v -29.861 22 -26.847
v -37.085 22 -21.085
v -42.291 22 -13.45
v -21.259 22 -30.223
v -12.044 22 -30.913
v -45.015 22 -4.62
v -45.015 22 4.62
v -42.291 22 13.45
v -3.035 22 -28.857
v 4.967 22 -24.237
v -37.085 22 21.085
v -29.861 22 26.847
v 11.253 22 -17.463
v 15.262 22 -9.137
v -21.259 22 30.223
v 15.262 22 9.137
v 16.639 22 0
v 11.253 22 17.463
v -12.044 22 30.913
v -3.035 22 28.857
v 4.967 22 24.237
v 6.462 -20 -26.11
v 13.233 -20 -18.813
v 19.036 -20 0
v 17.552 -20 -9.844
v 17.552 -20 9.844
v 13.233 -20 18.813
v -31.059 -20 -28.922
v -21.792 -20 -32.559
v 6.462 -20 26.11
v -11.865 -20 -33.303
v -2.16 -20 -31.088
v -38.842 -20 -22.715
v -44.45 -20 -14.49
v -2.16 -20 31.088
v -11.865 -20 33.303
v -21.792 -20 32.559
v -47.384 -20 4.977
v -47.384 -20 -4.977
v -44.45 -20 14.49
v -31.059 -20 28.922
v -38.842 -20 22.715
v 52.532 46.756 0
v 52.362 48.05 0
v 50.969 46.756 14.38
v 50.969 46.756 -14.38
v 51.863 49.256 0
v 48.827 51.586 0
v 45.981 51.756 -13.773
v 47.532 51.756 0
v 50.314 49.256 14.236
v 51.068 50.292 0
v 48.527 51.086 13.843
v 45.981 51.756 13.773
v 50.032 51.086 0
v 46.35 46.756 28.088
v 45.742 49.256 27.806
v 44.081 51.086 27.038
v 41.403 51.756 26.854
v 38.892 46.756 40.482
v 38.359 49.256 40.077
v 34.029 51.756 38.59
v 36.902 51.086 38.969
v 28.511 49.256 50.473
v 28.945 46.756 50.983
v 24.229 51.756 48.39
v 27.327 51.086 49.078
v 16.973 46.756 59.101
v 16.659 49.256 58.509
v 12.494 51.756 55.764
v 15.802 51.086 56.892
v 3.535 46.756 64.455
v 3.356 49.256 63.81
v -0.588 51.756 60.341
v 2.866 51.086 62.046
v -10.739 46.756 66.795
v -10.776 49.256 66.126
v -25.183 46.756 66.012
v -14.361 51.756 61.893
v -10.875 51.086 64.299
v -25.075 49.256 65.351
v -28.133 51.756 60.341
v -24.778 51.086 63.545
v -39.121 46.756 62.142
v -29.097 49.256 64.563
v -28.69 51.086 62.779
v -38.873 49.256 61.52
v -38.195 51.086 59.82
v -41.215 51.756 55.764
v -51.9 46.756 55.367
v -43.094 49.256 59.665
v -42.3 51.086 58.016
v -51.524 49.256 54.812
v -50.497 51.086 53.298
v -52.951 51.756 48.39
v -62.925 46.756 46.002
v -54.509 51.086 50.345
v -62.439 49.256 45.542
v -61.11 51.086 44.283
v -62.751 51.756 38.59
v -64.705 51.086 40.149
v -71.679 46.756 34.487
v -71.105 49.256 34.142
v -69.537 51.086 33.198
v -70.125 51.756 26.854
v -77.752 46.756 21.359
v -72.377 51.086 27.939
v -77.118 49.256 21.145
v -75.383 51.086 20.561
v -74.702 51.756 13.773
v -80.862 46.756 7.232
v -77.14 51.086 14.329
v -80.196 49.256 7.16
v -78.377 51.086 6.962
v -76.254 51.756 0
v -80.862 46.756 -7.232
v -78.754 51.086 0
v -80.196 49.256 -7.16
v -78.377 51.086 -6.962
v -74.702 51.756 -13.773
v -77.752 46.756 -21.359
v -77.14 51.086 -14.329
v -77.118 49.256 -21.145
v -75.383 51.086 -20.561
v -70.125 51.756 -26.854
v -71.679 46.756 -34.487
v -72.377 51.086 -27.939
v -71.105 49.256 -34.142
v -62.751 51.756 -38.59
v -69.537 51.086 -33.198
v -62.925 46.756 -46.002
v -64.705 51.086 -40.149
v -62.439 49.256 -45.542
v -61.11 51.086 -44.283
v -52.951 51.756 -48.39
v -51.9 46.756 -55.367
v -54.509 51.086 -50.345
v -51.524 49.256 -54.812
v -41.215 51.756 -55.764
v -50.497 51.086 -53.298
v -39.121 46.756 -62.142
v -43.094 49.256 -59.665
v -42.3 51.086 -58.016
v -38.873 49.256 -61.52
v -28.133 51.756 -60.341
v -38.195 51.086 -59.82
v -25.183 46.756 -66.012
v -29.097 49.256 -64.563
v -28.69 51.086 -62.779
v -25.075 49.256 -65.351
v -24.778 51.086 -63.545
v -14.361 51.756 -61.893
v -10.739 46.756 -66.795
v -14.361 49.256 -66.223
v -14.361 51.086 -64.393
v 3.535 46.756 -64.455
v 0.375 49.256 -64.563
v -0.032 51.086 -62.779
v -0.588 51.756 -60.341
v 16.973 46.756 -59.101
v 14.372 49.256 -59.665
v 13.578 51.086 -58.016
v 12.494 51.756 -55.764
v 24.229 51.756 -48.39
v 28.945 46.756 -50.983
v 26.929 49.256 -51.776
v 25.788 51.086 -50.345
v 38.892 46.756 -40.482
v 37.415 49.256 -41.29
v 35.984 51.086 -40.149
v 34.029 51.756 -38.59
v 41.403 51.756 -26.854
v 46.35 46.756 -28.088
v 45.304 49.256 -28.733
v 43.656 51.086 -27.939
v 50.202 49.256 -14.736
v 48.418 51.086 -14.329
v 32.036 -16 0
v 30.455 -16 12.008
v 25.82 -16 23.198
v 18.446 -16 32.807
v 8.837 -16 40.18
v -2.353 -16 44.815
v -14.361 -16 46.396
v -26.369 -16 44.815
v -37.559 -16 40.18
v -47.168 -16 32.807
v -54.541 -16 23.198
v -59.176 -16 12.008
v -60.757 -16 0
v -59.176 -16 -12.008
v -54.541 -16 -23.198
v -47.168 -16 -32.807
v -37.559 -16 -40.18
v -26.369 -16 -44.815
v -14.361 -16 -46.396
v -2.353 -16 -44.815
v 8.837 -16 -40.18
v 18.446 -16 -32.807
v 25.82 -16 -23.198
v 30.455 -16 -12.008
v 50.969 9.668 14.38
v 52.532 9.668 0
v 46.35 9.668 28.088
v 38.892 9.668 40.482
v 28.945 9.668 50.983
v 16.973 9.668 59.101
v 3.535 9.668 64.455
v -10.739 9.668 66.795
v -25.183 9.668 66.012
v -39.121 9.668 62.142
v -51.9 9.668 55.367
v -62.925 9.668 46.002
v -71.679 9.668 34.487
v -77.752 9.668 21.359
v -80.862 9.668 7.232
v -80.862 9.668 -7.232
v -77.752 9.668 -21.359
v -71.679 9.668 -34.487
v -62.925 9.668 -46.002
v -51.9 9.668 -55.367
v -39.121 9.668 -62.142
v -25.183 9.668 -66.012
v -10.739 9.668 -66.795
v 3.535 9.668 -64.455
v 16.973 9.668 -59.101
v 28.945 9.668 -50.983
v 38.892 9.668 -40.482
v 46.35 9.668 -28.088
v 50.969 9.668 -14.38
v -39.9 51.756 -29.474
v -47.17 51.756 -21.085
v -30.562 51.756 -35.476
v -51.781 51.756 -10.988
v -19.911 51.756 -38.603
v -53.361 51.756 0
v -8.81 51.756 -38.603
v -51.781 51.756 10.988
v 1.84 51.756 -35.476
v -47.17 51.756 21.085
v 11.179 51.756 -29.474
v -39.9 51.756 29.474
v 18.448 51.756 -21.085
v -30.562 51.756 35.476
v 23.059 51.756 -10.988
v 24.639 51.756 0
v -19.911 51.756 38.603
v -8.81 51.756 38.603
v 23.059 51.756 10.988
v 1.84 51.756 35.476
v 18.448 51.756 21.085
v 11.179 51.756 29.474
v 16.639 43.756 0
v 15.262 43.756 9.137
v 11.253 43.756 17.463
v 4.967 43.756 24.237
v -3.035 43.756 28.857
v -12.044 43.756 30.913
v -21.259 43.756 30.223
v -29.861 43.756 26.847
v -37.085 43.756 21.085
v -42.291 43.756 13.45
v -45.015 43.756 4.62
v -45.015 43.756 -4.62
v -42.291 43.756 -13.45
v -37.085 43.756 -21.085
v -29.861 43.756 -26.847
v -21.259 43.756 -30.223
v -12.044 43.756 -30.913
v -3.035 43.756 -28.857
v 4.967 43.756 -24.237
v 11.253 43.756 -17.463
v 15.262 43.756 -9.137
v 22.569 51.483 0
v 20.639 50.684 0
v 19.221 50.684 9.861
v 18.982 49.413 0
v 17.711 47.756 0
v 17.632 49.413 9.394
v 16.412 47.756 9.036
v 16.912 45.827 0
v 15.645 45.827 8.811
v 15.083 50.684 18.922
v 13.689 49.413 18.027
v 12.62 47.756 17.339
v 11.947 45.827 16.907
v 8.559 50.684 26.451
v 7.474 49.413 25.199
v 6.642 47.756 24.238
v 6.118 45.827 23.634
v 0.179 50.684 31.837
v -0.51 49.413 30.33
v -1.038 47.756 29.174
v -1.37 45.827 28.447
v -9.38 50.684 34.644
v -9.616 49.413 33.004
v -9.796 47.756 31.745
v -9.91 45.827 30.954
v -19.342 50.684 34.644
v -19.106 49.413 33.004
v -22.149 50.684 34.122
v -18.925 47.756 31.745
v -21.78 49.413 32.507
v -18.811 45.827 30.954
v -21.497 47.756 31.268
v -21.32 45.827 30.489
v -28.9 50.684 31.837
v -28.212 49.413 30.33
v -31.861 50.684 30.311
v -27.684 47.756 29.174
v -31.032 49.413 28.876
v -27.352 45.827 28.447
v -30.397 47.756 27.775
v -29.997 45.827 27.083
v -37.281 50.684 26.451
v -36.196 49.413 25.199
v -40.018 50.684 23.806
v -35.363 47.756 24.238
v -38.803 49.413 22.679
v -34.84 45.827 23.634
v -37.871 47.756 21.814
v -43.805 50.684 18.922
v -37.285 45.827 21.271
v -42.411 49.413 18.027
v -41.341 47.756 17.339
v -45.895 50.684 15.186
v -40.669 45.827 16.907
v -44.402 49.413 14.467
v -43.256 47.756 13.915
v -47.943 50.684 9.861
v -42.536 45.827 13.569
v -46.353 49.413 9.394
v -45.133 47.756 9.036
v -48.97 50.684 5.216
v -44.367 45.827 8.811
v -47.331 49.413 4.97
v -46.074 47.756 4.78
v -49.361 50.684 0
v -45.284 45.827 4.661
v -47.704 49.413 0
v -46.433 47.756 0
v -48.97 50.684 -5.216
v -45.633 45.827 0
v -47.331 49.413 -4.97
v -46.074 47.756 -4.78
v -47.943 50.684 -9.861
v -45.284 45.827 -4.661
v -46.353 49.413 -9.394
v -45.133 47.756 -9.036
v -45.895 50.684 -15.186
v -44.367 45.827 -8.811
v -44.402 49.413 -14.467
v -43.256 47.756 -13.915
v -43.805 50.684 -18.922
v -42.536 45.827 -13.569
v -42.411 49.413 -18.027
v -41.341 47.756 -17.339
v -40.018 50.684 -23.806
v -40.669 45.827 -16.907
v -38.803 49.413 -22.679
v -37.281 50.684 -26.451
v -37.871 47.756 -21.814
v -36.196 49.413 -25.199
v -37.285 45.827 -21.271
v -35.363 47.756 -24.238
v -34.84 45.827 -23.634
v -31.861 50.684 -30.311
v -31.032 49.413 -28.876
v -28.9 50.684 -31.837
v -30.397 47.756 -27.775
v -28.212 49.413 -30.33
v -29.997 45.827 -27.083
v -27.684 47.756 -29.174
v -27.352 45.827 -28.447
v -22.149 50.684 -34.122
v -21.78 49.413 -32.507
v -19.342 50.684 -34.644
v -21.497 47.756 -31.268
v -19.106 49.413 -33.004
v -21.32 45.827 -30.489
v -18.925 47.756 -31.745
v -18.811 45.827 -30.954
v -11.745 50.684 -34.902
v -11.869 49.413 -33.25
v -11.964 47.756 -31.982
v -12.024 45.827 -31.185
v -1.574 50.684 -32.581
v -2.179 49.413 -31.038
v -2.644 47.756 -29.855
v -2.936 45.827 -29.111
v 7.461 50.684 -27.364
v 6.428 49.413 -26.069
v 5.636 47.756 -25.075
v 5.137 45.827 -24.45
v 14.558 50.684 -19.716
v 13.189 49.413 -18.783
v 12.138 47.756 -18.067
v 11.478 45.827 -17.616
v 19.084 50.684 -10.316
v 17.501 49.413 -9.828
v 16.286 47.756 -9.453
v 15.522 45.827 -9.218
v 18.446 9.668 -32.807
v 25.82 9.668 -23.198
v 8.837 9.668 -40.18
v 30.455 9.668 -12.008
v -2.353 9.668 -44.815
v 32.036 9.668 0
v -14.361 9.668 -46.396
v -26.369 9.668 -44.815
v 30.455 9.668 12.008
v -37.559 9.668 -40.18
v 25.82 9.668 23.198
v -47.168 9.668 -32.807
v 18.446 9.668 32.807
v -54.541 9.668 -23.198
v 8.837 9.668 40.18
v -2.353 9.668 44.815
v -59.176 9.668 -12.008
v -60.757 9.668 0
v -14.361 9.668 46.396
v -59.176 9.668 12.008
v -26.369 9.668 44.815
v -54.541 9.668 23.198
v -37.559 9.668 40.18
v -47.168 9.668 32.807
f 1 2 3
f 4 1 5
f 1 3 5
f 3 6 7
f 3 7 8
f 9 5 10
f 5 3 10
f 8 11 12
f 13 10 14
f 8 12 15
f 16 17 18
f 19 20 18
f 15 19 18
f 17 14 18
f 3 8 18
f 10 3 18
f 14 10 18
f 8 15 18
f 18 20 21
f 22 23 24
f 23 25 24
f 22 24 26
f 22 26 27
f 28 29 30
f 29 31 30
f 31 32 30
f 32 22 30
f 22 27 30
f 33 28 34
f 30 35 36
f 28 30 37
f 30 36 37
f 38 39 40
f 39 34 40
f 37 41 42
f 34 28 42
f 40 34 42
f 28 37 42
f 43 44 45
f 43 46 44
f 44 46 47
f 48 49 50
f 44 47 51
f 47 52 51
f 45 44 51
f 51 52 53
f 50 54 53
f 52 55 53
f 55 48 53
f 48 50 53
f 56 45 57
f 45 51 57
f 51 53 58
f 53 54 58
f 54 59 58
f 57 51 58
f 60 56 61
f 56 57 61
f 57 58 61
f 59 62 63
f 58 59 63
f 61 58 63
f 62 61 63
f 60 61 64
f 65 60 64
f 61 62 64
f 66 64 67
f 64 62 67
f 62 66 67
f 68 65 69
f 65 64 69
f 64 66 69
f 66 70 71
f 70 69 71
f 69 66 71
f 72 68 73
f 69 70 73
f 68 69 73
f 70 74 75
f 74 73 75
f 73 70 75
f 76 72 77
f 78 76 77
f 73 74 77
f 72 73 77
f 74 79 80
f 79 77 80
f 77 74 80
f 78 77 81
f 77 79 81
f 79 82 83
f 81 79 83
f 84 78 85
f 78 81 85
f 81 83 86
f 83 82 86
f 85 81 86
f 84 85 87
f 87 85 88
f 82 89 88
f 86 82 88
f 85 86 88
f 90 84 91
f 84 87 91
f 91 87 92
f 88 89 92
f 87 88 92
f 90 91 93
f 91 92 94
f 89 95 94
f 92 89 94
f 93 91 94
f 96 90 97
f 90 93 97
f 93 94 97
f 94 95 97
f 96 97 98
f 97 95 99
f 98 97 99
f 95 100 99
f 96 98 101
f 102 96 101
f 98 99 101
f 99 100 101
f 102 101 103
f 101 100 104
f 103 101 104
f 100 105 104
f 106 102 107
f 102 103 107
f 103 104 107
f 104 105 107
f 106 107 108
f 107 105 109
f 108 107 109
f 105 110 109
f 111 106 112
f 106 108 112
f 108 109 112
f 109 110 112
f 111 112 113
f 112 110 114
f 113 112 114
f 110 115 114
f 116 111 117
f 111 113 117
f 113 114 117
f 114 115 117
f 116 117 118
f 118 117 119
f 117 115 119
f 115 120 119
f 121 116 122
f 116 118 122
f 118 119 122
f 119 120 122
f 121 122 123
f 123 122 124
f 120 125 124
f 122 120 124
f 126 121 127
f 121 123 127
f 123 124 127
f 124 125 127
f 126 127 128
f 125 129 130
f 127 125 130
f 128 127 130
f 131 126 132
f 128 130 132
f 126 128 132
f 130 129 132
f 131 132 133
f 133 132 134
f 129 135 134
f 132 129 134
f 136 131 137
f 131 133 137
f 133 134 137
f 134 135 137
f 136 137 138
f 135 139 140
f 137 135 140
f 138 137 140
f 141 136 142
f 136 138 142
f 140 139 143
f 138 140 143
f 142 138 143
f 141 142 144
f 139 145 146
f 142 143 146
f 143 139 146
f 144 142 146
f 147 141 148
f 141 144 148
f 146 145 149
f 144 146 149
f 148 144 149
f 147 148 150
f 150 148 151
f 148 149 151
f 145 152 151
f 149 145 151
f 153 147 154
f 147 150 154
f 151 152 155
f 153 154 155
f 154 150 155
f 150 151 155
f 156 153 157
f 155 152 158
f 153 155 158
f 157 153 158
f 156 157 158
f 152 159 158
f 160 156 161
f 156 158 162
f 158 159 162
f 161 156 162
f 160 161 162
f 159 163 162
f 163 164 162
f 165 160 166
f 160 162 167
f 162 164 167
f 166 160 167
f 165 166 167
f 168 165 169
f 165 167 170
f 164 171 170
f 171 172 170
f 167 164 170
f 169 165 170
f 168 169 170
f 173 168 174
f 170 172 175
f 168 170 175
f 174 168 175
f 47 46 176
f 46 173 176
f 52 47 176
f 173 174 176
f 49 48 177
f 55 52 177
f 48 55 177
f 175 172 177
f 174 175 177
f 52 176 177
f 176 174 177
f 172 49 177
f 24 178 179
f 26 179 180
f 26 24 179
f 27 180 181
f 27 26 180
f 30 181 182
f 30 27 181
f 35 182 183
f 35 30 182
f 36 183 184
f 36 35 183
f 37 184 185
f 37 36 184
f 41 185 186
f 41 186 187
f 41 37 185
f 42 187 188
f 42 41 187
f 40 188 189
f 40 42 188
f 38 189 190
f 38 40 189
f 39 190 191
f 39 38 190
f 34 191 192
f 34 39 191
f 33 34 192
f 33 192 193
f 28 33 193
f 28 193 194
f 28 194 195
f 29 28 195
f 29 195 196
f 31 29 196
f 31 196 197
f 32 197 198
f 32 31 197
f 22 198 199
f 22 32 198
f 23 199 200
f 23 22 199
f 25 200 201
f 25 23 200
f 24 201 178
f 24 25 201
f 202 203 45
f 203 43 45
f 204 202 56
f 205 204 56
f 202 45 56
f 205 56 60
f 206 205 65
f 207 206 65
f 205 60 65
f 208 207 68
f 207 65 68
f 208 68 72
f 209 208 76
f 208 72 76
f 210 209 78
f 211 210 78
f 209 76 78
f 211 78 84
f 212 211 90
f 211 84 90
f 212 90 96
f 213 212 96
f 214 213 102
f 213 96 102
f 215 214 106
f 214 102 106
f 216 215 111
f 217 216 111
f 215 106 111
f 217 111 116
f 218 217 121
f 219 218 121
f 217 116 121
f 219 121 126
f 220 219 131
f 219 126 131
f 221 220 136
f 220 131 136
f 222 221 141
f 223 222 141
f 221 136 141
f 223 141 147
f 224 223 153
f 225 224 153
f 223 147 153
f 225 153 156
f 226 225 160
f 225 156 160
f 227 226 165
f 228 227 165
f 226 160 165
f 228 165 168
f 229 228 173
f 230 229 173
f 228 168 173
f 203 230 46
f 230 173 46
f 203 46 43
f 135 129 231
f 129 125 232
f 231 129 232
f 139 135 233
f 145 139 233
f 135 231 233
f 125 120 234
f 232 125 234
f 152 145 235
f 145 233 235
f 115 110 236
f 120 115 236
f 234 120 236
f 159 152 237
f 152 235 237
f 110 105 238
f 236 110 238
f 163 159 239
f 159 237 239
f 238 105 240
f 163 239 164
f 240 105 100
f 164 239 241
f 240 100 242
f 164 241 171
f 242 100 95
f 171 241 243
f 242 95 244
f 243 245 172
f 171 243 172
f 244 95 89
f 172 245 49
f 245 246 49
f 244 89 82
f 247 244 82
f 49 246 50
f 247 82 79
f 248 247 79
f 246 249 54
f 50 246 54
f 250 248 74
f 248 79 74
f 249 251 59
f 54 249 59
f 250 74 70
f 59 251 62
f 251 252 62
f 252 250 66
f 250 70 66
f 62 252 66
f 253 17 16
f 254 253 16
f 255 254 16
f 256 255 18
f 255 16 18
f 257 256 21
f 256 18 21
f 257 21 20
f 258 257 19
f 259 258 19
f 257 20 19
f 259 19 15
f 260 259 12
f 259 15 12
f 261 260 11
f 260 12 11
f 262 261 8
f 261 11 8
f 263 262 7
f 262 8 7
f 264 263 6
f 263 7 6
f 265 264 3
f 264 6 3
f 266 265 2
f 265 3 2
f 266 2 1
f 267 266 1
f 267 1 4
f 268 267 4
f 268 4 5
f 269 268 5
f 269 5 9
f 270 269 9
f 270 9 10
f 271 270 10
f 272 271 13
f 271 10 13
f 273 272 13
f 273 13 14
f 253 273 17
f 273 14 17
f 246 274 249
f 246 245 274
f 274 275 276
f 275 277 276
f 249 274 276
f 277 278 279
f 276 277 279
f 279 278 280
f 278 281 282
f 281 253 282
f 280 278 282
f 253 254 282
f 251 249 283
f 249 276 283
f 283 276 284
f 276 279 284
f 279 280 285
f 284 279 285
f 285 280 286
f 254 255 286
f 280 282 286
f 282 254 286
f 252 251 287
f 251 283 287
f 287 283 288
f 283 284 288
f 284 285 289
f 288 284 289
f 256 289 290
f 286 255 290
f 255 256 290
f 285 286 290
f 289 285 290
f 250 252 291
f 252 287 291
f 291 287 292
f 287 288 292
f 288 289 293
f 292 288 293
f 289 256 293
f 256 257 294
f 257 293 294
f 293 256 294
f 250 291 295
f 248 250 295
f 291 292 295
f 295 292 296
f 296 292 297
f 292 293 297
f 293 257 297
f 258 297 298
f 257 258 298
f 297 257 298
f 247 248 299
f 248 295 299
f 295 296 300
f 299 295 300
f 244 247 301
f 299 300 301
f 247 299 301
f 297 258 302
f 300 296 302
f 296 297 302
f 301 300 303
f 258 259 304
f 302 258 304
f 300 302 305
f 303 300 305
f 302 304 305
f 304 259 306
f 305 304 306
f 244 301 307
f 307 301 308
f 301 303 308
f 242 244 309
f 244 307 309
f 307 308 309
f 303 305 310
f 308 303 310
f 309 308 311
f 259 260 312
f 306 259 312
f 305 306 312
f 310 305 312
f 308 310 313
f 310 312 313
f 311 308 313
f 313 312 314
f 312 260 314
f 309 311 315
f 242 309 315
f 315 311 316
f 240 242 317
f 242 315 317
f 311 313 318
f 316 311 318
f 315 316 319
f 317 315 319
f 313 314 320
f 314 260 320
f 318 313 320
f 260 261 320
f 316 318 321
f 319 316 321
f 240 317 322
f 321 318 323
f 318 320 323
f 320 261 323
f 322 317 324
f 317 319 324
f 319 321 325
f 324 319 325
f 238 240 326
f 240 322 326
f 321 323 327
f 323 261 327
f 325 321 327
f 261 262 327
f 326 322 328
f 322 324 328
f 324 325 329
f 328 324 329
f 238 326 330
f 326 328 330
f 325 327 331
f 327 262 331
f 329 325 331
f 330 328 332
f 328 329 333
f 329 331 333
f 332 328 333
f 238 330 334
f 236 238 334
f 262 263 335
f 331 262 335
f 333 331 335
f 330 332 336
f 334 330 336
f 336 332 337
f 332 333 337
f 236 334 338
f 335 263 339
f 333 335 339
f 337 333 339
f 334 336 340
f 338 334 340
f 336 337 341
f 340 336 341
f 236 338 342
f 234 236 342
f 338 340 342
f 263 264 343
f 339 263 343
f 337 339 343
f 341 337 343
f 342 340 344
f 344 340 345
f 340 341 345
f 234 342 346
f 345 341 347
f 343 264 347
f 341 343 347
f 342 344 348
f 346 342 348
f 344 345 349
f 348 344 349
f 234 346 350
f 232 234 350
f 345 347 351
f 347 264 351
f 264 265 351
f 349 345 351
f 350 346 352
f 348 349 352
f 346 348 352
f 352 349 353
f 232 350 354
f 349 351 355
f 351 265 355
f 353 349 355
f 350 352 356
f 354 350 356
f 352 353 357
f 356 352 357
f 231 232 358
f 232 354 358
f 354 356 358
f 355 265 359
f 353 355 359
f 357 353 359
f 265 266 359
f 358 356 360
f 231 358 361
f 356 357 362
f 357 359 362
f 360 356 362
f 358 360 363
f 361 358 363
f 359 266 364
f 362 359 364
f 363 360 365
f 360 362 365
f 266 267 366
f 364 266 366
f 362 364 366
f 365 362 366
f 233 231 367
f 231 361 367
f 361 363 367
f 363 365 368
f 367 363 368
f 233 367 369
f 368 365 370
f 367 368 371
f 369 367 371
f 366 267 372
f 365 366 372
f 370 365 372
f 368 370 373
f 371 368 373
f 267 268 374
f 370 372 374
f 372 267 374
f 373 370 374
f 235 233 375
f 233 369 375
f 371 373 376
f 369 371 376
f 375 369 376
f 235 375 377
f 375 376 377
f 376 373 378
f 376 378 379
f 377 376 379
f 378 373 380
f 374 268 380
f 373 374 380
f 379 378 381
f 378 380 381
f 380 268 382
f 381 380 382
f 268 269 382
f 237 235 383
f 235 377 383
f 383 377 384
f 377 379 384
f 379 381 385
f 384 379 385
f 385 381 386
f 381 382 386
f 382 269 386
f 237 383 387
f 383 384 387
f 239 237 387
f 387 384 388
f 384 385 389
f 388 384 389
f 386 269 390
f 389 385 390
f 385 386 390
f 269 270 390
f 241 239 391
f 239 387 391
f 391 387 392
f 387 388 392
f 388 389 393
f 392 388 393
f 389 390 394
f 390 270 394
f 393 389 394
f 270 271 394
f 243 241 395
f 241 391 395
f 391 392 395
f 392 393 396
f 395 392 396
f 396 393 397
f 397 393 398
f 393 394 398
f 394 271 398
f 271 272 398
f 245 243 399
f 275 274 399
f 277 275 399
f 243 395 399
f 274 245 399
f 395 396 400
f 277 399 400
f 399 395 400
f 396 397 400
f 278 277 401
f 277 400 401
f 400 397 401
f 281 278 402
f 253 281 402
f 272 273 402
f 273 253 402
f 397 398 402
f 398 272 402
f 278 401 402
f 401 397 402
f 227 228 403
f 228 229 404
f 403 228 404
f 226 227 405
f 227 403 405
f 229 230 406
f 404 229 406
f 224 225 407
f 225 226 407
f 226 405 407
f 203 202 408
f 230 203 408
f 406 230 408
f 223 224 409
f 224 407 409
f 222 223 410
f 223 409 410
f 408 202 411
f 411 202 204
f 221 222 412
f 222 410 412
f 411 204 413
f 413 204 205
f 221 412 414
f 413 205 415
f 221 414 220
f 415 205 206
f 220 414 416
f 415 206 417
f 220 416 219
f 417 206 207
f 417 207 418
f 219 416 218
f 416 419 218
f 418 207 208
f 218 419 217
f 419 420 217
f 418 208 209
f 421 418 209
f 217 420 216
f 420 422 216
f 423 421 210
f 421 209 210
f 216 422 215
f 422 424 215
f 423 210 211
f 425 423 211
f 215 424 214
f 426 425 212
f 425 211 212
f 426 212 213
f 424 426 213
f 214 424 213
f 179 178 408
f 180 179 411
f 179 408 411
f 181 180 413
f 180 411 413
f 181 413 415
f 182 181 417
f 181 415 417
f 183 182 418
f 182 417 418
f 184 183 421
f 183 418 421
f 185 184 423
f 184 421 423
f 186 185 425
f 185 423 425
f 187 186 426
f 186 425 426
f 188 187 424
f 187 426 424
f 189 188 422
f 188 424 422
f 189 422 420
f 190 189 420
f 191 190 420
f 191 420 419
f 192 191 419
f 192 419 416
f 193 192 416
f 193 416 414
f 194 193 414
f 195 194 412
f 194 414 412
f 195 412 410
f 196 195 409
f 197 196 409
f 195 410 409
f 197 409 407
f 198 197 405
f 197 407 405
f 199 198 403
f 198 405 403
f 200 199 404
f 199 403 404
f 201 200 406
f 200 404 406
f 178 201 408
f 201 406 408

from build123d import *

# Parameters (mm, degrees)
F2_R     = 8
F3_SIZE2 = 13
F3_SIZE  = 4


with BuildPart() as f1:
    # F0 (on Top) → F1 (revolve)
    with BuildSketch(Plane.XY):
        with BuildLine():
            Line((-14.3607687205, 22), (-14.3607687205, -20))
            Line((-14.3607687205, -20), (32.0355594158, -20))
            Line((32.0355594158, -20), (32.0355594158, 9.6684019268))
            Line((32.0355594158, 9.6684019268), (52.5324852616, 9.6684019268))
            Line((52.5324852616, 9.6684019268), (52.5324852616, 46.7559769824))
            ThreePointArc((52.5324852616, 46.7559769824), (51.0680191675, 50.2915108883), (47.5324852616, 51.7559769824))
            Line((47.5324852616, 51.7559769824), (16.6392312795, 51.7559769824))
            Line((16.6392312795, 51.7559769824), (16.6392312795, 22))
            Line((16.6392312795, 22), (-14.3607687205, 22))
        make_face()
    revolve(axis=Axis((-14.3607687205, 1, 0), (0, -1, 0)))

    # F2
    f2_edges = [f1.edges().sort_by_distance(p)[0] for p in [
        (-45.360769, 51.755977, 0),
    ]]
    fillet(f2_edges, radius=F2_R)

    # F3
    f3_edges = [f1.edges().sort_by_distance(p)[0] for p in [
        (-60.757097, -20, 0),
    ]]
    chamfer(f3_edges, length=F3_SIZE, length2=F3_SIZE2)


solid = f1.part
